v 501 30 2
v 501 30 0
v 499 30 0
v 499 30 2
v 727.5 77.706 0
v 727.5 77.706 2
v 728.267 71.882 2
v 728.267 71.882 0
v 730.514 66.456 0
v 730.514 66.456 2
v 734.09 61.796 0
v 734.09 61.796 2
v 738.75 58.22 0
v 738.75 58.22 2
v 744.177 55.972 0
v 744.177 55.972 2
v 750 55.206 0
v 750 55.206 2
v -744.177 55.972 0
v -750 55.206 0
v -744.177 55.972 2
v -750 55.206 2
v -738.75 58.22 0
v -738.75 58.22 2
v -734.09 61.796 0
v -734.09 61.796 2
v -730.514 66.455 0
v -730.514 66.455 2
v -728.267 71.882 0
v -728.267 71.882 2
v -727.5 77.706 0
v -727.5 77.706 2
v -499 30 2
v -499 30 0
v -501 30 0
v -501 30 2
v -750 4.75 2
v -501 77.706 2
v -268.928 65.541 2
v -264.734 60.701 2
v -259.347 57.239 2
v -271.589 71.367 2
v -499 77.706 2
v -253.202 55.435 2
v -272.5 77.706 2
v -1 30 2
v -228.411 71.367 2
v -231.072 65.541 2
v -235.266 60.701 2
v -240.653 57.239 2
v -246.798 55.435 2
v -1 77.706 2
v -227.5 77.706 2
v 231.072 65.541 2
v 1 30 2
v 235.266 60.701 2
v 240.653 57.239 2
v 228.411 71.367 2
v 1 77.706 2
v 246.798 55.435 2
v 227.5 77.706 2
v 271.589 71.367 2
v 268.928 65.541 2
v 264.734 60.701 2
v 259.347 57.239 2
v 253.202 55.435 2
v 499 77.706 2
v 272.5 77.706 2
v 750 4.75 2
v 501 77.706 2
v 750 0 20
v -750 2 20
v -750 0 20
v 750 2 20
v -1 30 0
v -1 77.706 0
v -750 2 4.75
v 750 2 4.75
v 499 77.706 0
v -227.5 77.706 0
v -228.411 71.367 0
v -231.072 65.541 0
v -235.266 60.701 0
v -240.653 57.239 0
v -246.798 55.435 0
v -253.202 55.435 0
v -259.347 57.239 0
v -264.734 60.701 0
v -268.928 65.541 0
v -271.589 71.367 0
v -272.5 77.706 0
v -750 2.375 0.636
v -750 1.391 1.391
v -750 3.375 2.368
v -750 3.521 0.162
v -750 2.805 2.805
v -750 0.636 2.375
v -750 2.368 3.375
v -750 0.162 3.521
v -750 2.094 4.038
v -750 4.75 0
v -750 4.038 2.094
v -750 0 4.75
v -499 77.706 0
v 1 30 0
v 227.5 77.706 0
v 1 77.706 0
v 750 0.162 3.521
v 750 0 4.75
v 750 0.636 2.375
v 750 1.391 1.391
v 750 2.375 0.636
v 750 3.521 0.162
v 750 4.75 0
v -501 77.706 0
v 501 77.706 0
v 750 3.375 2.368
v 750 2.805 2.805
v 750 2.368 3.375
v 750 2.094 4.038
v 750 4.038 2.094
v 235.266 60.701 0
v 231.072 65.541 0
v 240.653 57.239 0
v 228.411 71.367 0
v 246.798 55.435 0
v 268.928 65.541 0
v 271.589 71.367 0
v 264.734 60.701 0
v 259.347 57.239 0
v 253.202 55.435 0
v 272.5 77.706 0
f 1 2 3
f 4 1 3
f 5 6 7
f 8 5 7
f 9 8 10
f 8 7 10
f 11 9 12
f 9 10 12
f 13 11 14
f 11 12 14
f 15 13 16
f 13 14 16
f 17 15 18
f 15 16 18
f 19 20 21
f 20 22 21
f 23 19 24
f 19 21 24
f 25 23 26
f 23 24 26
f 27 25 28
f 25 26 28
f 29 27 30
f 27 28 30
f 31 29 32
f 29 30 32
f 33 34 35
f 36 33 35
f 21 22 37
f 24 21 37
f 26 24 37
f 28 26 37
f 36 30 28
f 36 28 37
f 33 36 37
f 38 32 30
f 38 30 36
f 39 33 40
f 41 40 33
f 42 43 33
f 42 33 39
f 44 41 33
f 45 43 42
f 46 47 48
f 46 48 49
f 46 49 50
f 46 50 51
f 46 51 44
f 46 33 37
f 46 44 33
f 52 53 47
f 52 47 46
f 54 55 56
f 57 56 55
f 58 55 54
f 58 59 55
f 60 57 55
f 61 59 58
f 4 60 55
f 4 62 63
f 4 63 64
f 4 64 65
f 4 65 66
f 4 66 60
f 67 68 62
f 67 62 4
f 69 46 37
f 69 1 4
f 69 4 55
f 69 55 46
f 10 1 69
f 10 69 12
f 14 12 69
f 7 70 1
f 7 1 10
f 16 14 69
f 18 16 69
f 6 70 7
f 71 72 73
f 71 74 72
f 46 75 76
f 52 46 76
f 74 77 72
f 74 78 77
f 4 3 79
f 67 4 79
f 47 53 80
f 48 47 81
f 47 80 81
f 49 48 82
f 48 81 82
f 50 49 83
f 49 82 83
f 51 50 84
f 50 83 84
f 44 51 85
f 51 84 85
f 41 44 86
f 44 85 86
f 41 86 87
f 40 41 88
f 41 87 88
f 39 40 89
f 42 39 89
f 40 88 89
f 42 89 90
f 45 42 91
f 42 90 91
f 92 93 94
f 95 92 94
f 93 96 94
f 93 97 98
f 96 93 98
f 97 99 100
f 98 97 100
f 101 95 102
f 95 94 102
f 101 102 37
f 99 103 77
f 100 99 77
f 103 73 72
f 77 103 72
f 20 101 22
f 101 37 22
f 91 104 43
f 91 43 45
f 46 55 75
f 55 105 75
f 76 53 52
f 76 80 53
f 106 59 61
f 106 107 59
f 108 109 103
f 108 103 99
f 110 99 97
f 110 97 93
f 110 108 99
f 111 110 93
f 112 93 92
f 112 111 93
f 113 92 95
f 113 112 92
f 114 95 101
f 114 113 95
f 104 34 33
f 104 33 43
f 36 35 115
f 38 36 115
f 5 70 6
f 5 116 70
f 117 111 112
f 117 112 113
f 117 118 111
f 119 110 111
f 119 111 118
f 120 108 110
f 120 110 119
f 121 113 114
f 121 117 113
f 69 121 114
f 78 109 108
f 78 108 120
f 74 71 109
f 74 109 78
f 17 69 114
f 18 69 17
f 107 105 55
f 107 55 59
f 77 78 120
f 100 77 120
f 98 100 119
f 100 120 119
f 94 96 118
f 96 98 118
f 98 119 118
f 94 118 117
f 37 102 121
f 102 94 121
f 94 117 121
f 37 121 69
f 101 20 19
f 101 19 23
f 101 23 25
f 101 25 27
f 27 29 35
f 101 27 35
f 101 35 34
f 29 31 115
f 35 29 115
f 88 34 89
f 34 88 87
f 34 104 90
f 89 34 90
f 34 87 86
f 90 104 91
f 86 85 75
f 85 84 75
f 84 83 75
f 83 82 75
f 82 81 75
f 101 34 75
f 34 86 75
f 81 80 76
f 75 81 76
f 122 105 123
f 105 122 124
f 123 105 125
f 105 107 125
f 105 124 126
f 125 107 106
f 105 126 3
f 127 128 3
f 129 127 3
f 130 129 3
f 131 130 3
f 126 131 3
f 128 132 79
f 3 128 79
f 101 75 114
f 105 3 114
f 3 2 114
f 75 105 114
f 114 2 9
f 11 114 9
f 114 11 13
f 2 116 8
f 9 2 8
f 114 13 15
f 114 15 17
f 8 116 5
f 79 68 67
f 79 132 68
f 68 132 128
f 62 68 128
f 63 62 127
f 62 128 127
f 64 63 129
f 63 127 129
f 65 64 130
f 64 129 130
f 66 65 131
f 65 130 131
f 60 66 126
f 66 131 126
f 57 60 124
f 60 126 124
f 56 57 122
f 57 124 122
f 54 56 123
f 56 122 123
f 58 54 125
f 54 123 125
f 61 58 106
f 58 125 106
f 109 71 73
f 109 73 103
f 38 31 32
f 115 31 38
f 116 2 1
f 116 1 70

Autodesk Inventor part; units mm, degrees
ref_plane "YZ Plane" through (0, 0, 0) normal (1, 0, 0) x (0, 1, 0)
ref_plane "XZ Plane" through (0, 0, 0) normal (0, 1, 0) x (-1, 0, 0)
ref_plane "XY Plane" through (0, 0, 0) normal (0, 0, 1) x (1, 0, 0)
sketch "Sketch1" plane through (0, 0, 0) normal (0, 0, 1) x (1, 0, 0)
  line L0 (-750, 77.7055) -> (750, 77.7055)
  line L1 (750, 77.7055) -> (750, 0)
  line L2 (750, 0) -> (-750, 0)
  line L3 (-750, 0) -> (-750, 77.7055)
  point P0 (0, 0)
  point P1 (0, 0)
  dimension "d0" = 1500
  dimension "d1" = 77.7056
extrude "Plate1" add sketch "Sketch1" along normal blind 2
sketch "Sketch2" plane through (750, 2, 0) normal (0, -1, 0) x (1, 0, 0)
  line L0 (-1500, 0) -> (0, 0)
  line L1 (0, 0) -> (0, 20)
  line L2 (0, 20) -> (-1500, 20)
  line L3 (-1500, 20) -> (-1500, 0)
edge flange "Flange1" height 20 angle 90 thickness 2 bend radius 2.75 thickness toward (0, -1, 0) relief round relief width 2 relief depth 1 edges at (0, 0, 2) wall of the first edge with corners at (-750, 2, 0) (750, 2, 0) (750, 2, 20) (-750, 2, 20)
bend "Bend1"
corner "Corner1"
sketch "Sketch5" plane through (0, 0, 0) normal (0, 0, -1) x (-1, 0, 0)
  line L0 (750, 77.7055) -> (-750, 77.7055) projected
  line L1 (-1, 30) -> (-1, 77.7055)
  line L2 (750, 0) -> (-750, 0) projected
  line L3 (-1, 30) -> (1, 30)
  line L4 (1, 30) -> (1, 77.7055)
  point P0 (0, 0)
  point P1 (0, 30)
  point P2 (0, 0)
  dimension "d27" = 2
  dimension "d28" = 30
extrude "Extrusion1" cut sketch "Sketch5" against normal through all
pattern_linear "Rectangular Pattern1" count 3 spacing 500 along (1, 0, 0) of "Extrusion1" first direction both ways yes
sketch "Sketch6" plane through (0, 0, 0) normal (0, 0, -1) x (-1, 0, 0)
  line L0 (-750, 77.7055) -> (-750, 4.75) projected
  circle A0 centre (-750, 77.7055) radius 22.5
  line L1 (-750, 77.7055) -> (750, 77.7055) projected
  line L2 (-1, 77.7055) -> (-1, 30) projected
  line L3 (-499, 77.7055) -> (-499, 30) projected
  line L4 (-1, 30) -> (-499, 30) construction
  circle A1 centre (-250, 77.7055) radius 22.5
  point P0 (0, 0)
  point P1 (-727.5, 77.7055)
  point P2 (-750, 55.2055)
  point P3 (-250, 30)
  dimension "d24" = 45
extrude "Extrusion2" cut sketch "Sketch6" along normal mid plane 30 contours L1 A0 L0 | A1 L1 | L1 A1 picked at (-748.3311, 62.8935)
mirror "Mirror1" about plane through (0, 0, 0) normal (1, 0, 0) of "Extrusion2"
sketch "Sketch7" plane through (0, 0, 2) normal (0, 0, 1) x (1, 0, 0)
  arc A0 (-750, 55.2055) -> (-727.5, 77.7055) centre (-750, 77.7055) ccw projected
  line L0 (-750, 4.75) -> (-750, 55.2055) projected
  line L1 (-750, 4.75) -> (750, 4.75) projected
  line L2 (750, 55.2055) -> (750, 4.75) projected
  arc A1 (727.5, 77.7055) -> (750, 55.2055) centre (750, 77.7055) ccw projected
  line L3 (501, 77.7055) -> (727.5, 77.7055) projected
  line L4 (501, 77.7055) -> (501, 30) projected
  line L5 (501, 30) -> (499, 30) projected
  line L6 (499, 30) -> (499, 77.7055) projected
  line L7 (1, 77.7055) -> (227.5, 77.7055) projected
  line L8 (1, 77.7055) -> (1, 30) projected
  line L9 (1, 30) -> (-1, 30) projected
  line L10 (-1, 30) -> (-1, 77.7055) projected
  line L11 (-499, 77.7055) -> (-272.5, 77.7055) projected
  line L12 (-499, 77.7055) -> (-499, 30) projected
  line L13 (-499, 30) -> (-501, 30) projected
  line L14 (-501, 30) -> (-501, 77.7055) projected
  line L15 (-727.5, 77.7055) -> (-501, 77.7055) projected
  line L16 (750, 4.75) -> (-750, 4.75) projected
  line L17 (650, 4.75) -> (650, 77.7055) construction
  line L18 (-750, 4.75) -> (750, 4.75) projected
  line L19 (646, 37.7637) -> (650, 44.6919)
  line L20 (650, 44.6919) -> (654, 37.7637)
  line L21 (654, 37.7637) -> (646, 37.7637)
  line L22 (650, 44.6919) -> (650, 37.7637) construction
  line L23 (626, 37.7637) -> (630, 44.6919)
  line L24 (630, 44.6919) -> (634, 37.7637)
  line L25 (634, 37.7637) -> (626, 37.7637)
  line L26 (630, 44.6919) -> (630, 37.7637) construction
  line L27 (272.5, 77.7055) -> (499, 77.7055) projected
  arc A2 (227.5, 77.7055) -> (272.5, 77.7055) centre (250, 77.7055) ccw projected
  line L28 (-227.5, 77.7055) -> (-1, 77.7055) projected
  arc A3 (-272.5, 77.7055) -> (-227.5, 77.7055) centre (-250, 77.7055) ccw projected
  point P0 (0, 0)
  point P1 (650, 41.2278)
  point P2 (630, 41.2278)
  dimension "d29" = 100
  dimension "d30" = 8
  dimension "d31" = 8
  dimension "d32" = 20
extrude "Extrusion3" [suppressed]
mirror "Mirror2" [suppressed]
sketch "Sketch8" plane through (0, 0, 2) normal (0, 0, 1) x (1, 0, 0)
  line L0 (496, 72.7055) -> (496, 60.7055) construction
  line L1 (496, 60.7055) -> (296, 60.7055) construction
  line L2 (296, 60.7055) -> (296, 72.7055) construction
  line L3 (296, 72.7055) -> (496, 72.7055) construction
  line L4 (501, 77.7055) -> (727.5, 77.7055) projected
  line L5 (272.5, 77.7055) -> (499, 77.7055) projected
  point P0 (0, 0)
  dimension "d35" = 200
  dimension "d36" = 12
  dimension "d39" = 3
  dimension "d40" = 5
mark "Mark1"
equation "\"d28\" = Стрингер_глубина_паза"
equation "\"d1\" = Стрингер_6"
equation "\"d27\" = d18"
equation "\"d2\" = Thickness"
equation "\"d3\" = BendReliefWidth"
equation "\"d4\" = BendReliefDepth"
equation "\"d5\" = MinimumRemnant"
equation "\"d6\" = TransitionRadius"
equation "\"d9\" = BendRadius"
equation "\"d10\" = CornerReliefSize"
equation "\"d11\" = GapSize"
equation "\"d12\" = JacobiRadiusSize"
equation "\"BendReliefWidth\" = Thickness"
equation "\"BendReliefDepth\" = 0.5 * Thickness"
equation "\"CornerReliefSize\" = 4 * Thickness"
equation "\"MinimumRemnant\" = 2 * Thickness"
equation "\"TransitionRadius\" = BendRadius"
equation "\"JacobiRadiusSize\" = BendRadius"
equation "\"GapSize\" = Thickness"
equation "\"d18\" = Thickness"
equation "\"Стрингер_6\" = 77.705549"
equation "\"Thickness\" = 2"
equation "\"BendRadius\" = 2.75"
equation "\"Стрингер_глубина_паза\" = 30"
properties part number "MSC 066 stringer board ####" material "Stainless Steel"
